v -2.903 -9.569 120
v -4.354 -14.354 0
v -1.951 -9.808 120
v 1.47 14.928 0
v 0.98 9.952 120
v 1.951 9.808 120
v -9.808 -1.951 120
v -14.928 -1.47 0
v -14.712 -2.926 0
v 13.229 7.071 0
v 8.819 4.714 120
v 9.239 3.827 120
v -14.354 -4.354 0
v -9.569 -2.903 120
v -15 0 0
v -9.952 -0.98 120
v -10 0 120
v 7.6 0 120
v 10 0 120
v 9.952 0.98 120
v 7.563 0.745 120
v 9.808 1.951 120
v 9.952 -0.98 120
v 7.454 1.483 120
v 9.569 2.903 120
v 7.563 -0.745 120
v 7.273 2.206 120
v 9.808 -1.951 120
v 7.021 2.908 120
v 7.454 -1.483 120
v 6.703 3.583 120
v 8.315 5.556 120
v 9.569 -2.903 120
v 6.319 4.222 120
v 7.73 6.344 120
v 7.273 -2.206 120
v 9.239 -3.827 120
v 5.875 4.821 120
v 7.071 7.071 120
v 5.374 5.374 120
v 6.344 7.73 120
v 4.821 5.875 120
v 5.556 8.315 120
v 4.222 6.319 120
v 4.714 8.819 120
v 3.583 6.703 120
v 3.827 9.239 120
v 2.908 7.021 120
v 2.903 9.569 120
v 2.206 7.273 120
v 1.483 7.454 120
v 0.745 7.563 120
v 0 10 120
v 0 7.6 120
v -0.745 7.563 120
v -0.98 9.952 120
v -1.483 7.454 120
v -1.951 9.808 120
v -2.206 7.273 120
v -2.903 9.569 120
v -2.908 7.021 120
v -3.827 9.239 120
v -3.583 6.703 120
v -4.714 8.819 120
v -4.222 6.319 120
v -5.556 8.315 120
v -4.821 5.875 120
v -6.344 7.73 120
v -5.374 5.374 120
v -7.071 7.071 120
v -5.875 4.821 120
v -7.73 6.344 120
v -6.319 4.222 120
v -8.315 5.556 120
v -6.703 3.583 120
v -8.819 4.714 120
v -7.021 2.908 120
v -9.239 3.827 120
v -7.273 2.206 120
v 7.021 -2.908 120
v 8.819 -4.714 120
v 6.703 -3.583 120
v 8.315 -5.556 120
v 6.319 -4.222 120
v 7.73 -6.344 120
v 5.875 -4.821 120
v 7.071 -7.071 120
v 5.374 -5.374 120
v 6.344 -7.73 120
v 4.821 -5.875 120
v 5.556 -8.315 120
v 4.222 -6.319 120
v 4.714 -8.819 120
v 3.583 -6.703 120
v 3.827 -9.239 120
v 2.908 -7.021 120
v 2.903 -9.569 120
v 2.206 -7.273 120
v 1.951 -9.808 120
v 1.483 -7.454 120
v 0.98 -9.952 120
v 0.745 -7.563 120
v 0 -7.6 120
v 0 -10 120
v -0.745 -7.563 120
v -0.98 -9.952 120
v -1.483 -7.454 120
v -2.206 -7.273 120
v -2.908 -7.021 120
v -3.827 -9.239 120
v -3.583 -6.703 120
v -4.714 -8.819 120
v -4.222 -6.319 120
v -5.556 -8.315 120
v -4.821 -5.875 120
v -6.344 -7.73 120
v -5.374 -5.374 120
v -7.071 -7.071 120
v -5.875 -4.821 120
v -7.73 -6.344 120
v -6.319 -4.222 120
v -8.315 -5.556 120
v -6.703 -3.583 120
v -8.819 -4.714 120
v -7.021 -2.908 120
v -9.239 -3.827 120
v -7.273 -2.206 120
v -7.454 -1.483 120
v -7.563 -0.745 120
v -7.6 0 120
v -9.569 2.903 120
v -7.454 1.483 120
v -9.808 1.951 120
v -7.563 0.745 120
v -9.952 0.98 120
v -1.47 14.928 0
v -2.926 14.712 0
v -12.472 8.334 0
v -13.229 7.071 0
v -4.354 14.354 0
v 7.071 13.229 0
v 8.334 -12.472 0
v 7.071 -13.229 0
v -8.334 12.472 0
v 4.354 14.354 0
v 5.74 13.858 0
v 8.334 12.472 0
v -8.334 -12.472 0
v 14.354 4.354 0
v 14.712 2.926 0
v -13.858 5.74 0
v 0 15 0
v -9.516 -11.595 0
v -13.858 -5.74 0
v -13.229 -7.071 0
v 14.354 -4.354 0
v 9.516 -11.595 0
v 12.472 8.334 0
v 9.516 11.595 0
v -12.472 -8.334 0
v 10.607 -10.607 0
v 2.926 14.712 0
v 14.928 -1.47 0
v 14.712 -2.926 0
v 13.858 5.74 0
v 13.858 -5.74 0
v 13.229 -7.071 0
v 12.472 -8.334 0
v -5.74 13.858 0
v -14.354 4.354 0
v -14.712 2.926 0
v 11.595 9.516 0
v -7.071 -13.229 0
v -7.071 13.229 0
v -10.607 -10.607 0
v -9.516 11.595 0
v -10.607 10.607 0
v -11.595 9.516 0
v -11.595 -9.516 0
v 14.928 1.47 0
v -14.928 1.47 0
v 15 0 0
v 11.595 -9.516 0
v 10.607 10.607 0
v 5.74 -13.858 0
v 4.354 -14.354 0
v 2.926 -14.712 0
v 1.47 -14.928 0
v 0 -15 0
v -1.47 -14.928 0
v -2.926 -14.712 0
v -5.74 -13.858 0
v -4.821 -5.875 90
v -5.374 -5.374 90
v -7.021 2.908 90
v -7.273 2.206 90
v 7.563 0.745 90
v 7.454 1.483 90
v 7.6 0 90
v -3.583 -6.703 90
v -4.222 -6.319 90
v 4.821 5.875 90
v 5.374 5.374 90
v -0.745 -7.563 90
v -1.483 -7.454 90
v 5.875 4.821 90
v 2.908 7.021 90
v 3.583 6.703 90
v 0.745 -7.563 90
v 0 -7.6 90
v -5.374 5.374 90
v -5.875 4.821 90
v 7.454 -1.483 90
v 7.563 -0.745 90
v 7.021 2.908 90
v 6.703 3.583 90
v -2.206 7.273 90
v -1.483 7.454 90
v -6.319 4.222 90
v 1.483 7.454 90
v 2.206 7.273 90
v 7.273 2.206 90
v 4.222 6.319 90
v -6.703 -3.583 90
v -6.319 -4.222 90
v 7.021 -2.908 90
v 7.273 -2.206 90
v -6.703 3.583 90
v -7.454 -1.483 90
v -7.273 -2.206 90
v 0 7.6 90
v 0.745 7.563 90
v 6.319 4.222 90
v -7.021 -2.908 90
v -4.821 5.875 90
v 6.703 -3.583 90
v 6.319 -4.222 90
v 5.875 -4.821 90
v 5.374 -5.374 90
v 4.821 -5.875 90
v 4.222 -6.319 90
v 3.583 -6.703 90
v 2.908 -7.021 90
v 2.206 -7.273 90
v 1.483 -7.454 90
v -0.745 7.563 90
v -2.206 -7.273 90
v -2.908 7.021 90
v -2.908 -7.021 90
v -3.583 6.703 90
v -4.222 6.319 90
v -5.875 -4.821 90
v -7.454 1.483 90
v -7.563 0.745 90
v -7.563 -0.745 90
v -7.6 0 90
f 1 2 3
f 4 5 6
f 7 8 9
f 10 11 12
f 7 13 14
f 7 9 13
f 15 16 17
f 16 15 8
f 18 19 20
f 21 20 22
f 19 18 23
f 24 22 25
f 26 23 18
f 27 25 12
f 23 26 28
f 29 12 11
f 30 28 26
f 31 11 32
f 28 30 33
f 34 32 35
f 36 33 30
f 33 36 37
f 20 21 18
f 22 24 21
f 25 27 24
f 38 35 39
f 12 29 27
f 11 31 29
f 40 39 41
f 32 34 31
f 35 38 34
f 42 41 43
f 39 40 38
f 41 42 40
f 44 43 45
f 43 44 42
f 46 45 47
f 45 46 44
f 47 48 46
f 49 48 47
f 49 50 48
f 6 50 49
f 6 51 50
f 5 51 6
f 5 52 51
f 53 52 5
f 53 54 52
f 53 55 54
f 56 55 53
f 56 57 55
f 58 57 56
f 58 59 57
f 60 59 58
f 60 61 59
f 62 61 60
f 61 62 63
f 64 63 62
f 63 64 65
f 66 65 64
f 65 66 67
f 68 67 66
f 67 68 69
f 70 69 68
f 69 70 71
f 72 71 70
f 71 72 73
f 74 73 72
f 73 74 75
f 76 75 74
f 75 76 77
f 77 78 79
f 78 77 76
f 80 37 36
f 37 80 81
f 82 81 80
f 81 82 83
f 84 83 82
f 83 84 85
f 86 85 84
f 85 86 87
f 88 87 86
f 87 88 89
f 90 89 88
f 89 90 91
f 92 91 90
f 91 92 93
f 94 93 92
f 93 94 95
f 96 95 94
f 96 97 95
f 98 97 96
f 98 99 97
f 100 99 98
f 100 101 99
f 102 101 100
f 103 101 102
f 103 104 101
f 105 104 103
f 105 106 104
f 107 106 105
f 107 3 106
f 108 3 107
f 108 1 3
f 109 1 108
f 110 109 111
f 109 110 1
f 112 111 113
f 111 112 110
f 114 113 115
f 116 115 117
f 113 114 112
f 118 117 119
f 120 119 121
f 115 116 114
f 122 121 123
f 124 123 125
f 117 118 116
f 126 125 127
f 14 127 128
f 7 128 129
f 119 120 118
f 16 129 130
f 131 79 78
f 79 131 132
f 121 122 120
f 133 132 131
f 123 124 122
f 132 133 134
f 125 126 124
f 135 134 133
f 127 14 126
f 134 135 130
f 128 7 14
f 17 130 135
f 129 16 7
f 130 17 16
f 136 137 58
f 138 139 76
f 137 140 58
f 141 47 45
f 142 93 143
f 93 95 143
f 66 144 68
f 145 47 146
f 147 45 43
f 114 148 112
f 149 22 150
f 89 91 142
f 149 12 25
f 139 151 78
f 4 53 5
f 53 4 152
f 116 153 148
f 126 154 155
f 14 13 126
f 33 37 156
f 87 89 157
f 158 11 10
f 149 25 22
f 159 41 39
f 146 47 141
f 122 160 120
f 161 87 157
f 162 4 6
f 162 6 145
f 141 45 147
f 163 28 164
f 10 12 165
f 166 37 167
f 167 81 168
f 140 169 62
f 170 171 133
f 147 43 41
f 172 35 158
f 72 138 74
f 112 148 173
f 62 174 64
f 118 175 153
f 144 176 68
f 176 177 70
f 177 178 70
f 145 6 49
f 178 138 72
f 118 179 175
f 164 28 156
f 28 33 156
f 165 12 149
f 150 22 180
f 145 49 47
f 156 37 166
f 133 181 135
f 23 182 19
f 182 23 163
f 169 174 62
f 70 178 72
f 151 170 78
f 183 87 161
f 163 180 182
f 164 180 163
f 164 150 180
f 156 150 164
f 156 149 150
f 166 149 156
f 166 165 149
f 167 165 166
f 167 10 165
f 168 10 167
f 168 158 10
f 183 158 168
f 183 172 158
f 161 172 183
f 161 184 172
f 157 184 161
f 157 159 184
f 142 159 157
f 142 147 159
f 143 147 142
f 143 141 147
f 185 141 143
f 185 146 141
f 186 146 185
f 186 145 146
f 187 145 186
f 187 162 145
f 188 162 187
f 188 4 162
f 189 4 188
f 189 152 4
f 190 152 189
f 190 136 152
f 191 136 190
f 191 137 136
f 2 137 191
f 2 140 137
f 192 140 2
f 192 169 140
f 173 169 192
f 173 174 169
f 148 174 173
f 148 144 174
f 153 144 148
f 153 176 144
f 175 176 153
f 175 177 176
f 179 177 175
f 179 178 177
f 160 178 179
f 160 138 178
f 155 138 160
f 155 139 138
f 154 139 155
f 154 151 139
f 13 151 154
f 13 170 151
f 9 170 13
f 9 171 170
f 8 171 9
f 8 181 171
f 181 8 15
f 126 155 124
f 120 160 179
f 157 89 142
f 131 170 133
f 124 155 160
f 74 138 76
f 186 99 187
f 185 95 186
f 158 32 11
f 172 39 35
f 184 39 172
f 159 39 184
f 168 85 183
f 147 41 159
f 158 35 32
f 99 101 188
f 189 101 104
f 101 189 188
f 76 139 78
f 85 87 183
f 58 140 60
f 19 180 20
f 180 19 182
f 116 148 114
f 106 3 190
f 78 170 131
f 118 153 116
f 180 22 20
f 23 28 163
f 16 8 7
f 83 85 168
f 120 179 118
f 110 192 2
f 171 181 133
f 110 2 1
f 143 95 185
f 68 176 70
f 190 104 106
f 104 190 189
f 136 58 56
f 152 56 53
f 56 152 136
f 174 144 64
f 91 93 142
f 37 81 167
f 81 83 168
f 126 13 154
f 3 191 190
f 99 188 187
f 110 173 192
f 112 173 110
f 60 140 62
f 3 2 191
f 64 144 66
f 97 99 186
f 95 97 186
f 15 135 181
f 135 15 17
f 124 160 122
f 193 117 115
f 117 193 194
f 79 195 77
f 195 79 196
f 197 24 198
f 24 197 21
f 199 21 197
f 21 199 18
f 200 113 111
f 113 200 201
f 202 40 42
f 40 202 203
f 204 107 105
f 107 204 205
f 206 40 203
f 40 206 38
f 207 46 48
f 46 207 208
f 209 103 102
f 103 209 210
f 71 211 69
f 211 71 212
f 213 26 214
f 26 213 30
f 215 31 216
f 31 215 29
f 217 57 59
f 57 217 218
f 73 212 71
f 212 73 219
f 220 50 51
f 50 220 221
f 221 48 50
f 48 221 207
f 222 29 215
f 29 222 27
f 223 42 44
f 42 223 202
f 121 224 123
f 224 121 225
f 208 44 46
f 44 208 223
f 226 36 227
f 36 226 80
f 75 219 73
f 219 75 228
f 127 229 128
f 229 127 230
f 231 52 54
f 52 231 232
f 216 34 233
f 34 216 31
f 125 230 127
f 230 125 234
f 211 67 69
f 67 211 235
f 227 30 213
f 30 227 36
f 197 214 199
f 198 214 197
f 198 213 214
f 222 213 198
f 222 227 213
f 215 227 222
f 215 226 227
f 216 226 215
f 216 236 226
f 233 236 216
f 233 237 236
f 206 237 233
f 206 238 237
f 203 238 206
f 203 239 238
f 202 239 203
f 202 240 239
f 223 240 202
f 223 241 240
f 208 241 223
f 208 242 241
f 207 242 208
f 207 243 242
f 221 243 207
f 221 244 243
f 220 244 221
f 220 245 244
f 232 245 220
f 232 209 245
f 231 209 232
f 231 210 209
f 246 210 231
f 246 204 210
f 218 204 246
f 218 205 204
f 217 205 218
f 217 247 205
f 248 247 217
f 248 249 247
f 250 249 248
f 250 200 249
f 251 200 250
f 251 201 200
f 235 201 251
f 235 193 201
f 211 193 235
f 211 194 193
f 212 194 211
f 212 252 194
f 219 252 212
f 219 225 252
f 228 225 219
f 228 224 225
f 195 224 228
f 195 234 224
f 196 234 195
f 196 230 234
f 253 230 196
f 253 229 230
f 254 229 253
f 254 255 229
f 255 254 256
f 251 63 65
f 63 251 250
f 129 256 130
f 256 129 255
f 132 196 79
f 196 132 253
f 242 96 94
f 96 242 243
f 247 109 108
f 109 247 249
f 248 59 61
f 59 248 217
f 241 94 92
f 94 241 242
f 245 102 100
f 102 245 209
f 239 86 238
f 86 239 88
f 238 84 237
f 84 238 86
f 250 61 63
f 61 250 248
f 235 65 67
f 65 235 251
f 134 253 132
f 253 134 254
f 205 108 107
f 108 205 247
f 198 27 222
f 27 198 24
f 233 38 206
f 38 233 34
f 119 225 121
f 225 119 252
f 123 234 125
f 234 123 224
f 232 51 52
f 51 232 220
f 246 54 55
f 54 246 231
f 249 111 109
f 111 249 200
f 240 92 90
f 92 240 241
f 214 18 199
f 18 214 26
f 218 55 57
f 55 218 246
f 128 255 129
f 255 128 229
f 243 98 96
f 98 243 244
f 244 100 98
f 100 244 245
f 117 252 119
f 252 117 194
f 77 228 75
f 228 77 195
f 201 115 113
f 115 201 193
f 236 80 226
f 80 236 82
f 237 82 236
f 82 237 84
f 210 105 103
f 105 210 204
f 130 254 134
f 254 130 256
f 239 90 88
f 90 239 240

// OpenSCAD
// handle
// 15.09.2025 Sebastian Weigl

// set the fregment sizes
$fn = $preview ? 48 : 64;
// declare vars
//  first body
fir_body_height=120;
fir_body_diameter=20;
bottom_diameter=30;
//  second body
sec_body_height=30;
sec_body_diameter=15.2;

difference() {
  cylinder(h=fir_body_height,d2=fir_body_diameter,d1=bottom_diameter,center=false);
  translate([0,0,fir_body_height-sec_body_height])
    cylinder(h=sec_body_height,d=sec_body_diameter,center=false);
}
  
